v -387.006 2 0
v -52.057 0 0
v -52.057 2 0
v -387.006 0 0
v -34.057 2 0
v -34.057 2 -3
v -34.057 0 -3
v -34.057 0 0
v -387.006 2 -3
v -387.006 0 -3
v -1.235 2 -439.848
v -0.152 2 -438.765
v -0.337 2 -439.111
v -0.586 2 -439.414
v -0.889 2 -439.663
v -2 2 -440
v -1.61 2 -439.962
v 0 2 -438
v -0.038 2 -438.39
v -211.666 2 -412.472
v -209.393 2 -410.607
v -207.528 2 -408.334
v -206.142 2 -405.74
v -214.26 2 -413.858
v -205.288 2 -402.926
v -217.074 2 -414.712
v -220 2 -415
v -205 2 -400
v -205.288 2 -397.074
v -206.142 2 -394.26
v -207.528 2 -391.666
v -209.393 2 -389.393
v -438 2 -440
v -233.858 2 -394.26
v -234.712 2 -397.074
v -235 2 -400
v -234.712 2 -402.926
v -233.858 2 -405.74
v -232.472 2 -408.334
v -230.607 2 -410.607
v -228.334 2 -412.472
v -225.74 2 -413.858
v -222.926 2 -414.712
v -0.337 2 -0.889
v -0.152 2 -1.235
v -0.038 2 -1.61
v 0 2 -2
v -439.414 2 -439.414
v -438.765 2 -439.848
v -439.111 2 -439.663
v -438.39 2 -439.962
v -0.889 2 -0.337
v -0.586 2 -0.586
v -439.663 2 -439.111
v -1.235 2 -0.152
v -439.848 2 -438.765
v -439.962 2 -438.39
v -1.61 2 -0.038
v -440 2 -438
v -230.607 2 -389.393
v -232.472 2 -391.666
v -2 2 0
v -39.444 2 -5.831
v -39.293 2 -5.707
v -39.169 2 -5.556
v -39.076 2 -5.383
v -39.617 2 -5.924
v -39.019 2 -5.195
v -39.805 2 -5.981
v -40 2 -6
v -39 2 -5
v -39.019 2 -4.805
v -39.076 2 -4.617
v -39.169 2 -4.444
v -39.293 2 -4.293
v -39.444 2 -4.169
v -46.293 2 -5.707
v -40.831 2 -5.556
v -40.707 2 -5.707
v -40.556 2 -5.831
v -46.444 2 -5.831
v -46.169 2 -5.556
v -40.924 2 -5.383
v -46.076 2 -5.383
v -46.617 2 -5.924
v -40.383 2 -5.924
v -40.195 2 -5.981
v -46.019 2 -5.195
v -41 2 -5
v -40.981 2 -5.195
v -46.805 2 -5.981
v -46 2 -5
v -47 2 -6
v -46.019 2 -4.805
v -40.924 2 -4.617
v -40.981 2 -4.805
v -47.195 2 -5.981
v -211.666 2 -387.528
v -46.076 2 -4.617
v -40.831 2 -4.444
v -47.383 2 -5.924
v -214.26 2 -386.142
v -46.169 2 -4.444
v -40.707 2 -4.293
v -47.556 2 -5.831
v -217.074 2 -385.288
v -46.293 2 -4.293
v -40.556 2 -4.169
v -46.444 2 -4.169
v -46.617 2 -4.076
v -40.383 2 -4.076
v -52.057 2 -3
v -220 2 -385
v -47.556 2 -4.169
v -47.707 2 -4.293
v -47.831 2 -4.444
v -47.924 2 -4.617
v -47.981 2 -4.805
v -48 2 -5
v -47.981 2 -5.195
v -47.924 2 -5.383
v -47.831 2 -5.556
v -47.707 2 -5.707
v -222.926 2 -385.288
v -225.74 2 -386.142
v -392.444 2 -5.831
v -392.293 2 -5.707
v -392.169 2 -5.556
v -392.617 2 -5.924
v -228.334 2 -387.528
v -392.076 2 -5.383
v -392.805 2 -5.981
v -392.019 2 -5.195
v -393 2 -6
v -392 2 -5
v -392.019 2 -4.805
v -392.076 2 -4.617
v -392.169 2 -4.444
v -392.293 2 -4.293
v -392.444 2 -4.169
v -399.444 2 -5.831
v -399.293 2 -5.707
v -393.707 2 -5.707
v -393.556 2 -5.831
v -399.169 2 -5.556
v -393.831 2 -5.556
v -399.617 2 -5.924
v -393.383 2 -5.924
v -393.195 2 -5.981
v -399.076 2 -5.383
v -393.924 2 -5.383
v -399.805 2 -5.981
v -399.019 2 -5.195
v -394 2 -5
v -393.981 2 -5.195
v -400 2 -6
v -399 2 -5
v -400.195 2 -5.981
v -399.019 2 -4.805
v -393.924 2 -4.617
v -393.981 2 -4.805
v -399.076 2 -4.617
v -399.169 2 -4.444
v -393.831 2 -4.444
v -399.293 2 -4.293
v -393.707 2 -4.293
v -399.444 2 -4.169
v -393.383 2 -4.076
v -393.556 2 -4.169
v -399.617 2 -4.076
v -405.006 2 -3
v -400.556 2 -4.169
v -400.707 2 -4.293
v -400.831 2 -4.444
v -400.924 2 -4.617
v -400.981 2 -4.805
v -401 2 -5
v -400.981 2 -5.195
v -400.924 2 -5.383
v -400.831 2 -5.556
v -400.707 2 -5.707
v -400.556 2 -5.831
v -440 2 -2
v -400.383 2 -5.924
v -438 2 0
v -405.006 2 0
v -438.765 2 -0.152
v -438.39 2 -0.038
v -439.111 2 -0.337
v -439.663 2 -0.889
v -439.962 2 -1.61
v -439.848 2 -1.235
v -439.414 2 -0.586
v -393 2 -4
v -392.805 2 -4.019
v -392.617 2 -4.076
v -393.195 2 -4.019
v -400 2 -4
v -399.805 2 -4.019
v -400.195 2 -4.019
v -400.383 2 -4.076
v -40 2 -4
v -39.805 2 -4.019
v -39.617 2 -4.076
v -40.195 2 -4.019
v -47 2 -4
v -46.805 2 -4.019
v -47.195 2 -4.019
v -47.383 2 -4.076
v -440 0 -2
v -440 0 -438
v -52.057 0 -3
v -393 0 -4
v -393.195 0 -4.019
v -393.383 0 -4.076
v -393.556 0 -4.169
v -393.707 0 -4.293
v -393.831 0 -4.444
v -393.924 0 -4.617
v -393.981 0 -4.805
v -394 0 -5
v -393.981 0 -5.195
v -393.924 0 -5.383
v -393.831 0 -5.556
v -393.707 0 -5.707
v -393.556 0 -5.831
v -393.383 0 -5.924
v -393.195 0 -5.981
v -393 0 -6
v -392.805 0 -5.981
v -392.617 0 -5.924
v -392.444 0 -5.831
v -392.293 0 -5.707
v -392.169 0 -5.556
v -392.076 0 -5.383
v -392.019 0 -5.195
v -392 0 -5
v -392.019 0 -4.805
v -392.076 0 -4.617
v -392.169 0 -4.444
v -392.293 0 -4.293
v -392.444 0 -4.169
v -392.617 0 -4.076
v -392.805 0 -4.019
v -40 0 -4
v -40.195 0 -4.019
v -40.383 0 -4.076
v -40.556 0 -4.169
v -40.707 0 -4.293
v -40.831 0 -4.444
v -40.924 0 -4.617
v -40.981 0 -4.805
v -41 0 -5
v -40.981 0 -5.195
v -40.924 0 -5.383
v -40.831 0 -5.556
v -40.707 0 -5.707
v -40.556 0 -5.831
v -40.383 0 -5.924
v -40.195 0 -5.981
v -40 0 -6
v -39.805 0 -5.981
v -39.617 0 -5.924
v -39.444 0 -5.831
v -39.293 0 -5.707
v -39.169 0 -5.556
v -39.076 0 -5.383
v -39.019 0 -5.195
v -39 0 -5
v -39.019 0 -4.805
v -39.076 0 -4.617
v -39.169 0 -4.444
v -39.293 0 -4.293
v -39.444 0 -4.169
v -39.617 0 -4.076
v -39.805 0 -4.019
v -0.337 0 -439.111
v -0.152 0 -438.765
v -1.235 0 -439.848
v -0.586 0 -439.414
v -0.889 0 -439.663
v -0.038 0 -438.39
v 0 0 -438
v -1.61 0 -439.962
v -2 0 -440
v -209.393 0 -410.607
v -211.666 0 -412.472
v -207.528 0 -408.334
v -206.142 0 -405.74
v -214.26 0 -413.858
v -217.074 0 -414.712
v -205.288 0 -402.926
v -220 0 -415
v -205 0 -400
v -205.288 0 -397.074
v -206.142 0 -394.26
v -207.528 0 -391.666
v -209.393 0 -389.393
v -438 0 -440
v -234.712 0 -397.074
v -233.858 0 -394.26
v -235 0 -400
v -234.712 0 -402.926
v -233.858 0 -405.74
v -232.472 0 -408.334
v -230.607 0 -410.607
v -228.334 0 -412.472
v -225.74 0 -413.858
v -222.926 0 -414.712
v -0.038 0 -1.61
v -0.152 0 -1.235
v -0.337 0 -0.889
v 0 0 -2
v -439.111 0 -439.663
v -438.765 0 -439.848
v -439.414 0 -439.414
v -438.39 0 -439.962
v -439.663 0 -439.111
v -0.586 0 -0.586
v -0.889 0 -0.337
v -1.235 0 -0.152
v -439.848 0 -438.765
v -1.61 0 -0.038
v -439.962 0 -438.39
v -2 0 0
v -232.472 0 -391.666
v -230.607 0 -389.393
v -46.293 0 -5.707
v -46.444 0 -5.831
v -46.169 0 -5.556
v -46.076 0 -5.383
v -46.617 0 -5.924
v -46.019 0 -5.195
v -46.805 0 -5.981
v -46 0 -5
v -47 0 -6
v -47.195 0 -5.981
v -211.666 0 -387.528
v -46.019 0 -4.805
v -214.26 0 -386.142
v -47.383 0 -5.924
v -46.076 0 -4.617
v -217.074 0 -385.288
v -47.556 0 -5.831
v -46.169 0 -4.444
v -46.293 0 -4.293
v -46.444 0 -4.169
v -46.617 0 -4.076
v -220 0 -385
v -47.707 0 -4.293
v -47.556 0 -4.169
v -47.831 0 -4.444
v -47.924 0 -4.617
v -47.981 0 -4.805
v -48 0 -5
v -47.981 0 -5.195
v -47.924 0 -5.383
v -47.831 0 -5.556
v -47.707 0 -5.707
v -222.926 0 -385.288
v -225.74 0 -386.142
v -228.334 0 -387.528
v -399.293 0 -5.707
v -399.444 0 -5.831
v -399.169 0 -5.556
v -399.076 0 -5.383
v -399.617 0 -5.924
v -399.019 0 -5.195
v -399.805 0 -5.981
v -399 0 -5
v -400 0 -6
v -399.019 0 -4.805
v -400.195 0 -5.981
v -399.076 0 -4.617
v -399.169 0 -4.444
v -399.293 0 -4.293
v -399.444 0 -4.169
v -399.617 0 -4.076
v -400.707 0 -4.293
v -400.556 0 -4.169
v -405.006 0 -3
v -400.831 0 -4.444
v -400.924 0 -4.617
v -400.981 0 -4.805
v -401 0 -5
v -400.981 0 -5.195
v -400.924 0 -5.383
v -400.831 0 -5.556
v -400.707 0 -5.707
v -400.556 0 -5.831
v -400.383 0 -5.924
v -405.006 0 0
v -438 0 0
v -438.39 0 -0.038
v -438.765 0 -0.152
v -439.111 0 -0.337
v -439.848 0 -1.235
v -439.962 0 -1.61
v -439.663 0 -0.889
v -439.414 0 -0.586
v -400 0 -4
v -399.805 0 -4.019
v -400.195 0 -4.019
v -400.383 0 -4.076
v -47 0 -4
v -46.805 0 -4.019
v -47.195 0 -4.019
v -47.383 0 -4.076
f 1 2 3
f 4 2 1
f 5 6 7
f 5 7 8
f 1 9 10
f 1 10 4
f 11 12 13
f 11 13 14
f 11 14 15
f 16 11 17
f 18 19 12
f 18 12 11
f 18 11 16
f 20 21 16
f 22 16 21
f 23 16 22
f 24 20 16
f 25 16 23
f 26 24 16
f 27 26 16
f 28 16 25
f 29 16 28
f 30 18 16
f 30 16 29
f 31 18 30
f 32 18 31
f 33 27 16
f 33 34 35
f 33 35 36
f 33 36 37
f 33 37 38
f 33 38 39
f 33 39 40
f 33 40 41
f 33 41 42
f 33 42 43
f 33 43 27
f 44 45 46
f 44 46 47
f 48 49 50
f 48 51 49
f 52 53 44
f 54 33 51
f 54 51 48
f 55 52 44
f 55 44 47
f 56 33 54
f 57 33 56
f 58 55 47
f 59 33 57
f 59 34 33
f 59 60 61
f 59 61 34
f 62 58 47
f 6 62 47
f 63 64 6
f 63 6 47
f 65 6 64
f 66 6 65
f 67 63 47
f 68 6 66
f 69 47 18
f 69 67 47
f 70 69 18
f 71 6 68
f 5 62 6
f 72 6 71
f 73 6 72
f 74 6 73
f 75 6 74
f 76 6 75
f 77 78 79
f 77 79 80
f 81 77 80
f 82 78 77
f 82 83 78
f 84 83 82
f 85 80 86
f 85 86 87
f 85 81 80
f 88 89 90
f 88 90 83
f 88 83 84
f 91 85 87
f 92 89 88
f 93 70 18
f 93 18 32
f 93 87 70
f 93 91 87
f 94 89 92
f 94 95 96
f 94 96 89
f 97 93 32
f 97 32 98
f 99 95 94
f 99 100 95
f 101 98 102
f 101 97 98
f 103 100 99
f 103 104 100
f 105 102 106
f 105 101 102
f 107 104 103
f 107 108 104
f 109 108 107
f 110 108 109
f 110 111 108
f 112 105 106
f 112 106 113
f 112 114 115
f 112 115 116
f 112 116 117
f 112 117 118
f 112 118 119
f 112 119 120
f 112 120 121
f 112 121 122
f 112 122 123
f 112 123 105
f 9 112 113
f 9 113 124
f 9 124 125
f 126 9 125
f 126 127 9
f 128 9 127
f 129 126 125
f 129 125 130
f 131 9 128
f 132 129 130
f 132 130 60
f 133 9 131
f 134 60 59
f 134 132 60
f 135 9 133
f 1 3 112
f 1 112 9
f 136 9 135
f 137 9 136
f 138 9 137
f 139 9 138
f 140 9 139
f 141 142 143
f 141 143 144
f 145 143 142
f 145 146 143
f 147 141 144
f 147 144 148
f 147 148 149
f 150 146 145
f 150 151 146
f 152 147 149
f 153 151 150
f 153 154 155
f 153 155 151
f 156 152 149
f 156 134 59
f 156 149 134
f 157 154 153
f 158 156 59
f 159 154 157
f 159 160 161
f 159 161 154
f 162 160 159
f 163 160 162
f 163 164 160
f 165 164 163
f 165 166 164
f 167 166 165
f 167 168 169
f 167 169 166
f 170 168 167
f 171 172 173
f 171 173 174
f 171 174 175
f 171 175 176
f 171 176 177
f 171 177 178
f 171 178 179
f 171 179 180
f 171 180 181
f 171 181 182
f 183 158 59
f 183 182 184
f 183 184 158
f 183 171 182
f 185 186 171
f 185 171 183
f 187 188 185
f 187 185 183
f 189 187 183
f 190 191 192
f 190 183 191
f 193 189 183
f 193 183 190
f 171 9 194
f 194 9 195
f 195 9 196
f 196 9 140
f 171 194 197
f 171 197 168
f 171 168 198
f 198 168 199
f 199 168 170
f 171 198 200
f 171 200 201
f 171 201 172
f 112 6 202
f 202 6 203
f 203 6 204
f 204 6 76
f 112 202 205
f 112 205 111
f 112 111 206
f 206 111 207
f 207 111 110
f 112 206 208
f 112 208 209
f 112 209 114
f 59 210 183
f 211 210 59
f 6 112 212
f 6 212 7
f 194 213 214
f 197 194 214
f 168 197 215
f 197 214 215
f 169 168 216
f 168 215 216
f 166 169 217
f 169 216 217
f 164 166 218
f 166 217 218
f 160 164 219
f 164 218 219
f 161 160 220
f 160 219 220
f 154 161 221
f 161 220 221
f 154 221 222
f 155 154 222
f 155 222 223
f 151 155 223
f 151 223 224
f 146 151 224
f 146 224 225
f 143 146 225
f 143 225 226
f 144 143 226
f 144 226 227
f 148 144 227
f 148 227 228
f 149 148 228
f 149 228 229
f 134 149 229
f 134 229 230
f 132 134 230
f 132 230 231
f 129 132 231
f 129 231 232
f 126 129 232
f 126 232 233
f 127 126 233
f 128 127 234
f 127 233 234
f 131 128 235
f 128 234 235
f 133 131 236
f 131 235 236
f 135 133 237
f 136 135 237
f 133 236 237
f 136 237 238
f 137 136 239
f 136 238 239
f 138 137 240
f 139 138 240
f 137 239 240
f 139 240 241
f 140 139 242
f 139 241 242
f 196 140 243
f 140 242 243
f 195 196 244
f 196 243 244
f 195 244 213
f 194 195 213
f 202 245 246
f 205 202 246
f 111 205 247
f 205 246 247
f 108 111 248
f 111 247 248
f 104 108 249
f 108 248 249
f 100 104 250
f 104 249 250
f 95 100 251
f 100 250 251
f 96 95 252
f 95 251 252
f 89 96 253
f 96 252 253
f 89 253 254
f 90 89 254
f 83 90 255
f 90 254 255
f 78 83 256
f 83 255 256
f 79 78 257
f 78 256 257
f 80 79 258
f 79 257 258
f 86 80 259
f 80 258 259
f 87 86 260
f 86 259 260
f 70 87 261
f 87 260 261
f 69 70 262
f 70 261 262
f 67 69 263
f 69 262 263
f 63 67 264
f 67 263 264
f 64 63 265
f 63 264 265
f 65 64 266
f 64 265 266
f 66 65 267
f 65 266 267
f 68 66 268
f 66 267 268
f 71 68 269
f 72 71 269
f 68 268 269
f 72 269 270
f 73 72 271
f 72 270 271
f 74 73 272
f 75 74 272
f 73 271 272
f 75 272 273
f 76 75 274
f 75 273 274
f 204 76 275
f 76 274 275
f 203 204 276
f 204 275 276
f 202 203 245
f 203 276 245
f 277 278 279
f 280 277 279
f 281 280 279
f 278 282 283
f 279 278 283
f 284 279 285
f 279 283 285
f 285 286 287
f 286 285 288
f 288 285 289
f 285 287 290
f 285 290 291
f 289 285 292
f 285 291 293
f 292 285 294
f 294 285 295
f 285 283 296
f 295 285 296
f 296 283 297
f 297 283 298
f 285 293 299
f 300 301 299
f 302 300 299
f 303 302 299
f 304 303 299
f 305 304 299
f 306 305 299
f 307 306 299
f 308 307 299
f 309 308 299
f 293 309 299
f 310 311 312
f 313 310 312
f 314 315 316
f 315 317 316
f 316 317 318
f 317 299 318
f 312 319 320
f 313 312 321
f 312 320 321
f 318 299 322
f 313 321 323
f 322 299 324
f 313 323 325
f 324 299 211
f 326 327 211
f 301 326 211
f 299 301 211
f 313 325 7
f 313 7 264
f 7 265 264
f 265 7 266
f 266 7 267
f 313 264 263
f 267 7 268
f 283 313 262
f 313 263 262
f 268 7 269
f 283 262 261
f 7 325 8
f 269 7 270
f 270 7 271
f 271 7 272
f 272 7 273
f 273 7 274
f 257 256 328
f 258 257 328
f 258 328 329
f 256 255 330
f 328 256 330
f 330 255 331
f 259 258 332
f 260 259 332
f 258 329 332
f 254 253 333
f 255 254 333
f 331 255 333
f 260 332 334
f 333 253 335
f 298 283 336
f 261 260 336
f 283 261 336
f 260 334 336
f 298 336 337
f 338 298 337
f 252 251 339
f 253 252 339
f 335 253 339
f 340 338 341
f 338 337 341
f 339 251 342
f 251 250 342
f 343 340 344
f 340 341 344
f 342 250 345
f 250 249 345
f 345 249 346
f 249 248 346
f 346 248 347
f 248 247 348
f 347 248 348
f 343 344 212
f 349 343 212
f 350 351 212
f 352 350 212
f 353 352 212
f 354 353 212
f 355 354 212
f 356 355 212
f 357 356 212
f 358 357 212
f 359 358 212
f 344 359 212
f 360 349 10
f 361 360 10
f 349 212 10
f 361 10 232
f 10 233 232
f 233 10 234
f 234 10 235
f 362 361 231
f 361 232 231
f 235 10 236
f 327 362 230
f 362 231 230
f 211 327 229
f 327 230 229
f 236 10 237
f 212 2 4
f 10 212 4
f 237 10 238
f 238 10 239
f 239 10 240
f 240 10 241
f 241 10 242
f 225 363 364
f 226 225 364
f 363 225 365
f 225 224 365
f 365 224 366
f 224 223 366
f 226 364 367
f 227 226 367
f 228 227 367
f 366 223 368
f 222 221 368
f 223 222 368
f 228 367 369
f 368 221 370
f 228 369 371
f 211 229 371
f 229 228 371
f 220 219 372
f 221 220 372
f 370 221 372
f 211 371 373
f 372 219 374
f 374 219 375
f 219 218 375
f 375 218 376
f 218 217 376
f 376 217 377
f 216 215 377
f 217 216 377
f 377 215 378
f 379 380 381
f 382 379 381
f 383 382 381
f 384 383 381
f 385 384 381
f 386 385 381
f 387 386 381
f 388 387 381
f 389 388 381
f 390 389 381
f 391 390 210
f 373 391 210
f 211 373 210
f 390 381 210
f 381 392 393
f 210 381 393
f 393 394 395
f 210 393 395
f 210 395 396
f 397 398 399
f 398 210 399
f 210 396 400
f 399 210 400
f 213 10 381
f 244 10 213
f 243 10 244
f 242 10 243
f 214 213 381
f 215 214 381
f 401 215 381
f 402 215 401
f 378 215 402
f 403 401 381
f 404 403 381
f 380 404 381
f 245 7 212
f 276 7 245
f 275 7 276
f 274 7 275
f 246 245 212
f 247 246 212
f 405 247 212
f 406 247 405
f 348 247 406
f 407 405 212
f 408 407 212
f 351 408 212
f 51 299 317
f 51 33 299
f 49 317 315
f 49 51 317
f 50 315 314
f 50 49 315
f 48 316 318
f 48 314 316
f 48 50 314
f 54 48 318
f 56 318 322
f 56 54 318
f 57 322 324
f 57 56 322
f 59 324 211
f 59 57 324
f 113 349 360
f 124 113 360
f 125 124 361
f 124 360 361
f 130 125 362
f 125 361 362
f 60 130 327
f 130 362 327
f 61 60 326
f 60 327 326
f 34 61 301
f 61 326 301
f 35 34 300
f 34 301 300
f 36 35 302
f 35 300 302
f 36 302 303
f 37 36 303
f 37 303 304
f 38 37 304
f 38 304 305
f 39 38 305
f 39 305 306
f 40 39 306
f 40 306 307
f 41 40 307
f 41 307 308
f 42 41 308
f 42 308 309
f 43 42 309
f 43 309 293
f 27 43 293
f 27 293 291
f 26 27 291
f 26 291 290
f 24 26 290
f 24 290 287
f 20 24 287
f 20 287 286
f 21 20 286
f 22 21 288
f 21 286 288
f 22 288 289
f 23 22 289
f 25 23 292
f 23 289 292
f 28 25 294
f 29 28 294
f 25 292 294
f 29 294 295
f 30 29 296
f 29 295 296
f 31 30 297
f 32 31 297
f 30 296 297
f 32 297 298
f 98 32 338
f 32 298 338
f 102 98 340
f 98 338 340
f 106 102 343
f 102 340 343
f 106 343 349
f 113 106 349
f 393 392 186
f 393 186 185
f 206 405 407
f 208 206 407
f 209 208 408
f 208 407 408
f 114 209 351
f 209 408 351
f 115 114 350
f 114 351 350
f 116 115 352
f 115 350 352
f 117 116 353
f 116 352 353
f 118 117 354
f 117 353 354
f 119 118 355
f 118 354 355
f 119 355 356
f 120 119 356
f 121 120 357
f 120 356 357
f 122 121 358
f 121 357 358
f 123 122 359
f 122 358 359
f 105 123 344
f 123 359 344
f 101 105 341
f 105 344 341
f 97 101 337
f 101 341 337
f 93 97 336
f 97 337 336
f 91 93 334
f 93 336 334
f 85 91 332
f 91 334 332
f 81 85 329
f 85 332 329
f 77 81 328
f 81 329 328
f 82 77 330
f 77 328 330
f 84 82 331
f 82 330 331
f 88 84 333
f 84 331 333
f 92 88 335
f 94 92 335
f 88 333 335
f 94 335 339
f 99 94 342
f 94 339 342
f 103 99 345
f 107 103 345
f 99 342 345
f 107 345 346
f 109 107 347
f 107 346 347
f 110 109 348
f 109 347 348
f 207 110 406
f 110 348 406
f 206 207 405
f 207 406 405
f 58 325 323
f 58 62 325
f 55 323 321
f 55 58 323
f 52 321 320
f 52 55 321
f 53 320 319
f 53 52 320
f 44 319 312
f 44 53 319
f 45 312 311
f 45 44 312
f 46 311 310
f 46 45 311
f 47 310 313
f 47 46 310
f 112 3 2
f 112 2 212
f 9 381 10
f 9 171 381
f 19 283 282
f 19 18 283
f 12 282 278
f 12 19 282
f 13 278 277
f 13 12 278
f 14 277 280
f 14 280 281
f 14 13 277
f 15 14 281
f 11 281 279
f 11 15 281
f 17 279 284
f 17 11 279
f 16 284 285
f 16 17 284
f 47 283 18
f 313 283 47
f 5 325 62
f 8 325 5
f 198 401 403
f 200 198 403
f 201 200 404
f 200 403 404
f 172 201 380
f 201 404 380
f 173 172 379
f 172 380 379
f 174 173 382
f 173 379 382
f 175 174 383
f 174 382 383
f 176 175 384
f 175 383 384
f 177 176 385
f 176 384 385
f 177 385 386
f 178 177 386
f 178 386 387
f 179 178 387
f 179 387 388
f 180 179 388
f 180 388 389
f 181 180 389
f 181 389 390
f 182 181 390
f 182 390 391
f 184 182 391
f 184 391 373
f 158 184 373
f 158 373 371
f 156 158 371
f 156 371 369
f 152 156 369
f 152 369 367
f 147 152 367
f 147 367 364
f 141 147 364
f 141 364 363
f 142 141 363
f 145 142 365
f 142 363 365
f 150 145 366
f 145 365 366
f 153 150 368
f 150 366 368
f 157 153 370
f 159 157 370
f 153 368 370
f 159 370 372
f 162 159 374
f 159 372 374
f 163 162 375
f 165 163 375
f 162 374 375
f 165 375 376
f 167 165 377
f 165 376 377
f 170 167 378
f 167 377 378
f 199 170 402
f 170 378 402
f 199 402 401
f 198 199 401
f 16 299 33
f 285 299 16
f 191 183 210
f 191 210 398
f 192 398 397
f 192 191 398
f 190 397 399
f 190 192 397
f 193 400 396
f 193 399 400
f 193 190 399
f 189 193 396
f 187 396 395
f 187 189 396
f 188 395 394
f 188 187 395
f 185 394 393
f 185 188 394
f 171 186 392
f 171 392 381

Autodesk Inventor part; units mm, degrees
ref_plane "YZ Plane" through (0, 0, 0) normal (1, 0, 0) x (0, 1, 0)
ref_plane "XZ Plane" through (0, 0, 0) normal (0, 1, 0) x (-1, 0, 0)
ref_plane "XY Plane" through (0, 0, 0) normal (0, 0, 1) x (1, 0, 0)
sketch "Esboço1" plane through (0, 0, 0) normal (0, 1, 0) x (-1, 0, 0)
  line L0 (0, 0) -> (440, 0)
  line L1 (440, 0) -> (440, -440)
  line L2 (440, -440) -> (0, -440)
  line L3 (0, -440) -> (0, 0)
  dimension "d0" = 440
  dimension "d1" = 440
extrude "Extrusão1" add sketch "Esboço1" along normal blind 2
sketch "Esboço2" plane through (0, 2, 0) normal (0, 1, 0) x (1, 0, 0)
  point P0 (0, 0)
  point P1 (-40, 5)
  point P2 (-47, 5)
  point P3 (-400, 5)
  point P4 (-393, 5)
hole "Furo1" at (-40, 2, -5) at (-47, 2, -5) at (-400, 2, -5) at (-393, 2, -5) direction (0, -1, 0) diameter 2 end through all
fillet "Arredondamento1" radius 2 4 edges at (0, 1, -440) (-440, 1, -440) (-440, 1, 0) (0, 1, 0)
sketch "Esboço3" plane through (0, 2, 0) normal (0, 1, 0) x (1, 0, 0)
  point P0 (0, 0)
  point P1 (-220, 400)
hole "Furo2" at (-220, 2, -400) direction (0, -1, 0) diameter 30 end through all
sketch "Esboço4" plane through (0, 2, 0) normal (0, 1, 0) x (1, 0, 0)
  line L0 (-438, 0) -> (-2, 0) projected
  line L1 (-34.0574, 0) -> (-52.0574, 0)
  line L2 (-52.0574, 0) -> (-52.0574, 3)
  line L3 (-52.0574, 3) -> (-34.0574, 3)
  line L4 (-34.0574, 3) -> (-34.0574, 0)
  line L5 (-387.0061, 0) -> (-405.0061, 0)
  line L6 (-405.0061, 0) -> (-405.0061, 3)
  line L7 (-405.0061, 3) -> (-387.0061, 3)
  line L8 (-387.0061, 3) -> (-387.0061, 0)
  point P0 (0, 0)
  dimension "d19" = 18
  dimension "d20" = 3
  dimension "d21" = 18
  dimension "d22" = 3
extrude "Extrusão2" cut sketch "Esboço4" against normal blind 2
properties part number "porta" material "Acrílico"
